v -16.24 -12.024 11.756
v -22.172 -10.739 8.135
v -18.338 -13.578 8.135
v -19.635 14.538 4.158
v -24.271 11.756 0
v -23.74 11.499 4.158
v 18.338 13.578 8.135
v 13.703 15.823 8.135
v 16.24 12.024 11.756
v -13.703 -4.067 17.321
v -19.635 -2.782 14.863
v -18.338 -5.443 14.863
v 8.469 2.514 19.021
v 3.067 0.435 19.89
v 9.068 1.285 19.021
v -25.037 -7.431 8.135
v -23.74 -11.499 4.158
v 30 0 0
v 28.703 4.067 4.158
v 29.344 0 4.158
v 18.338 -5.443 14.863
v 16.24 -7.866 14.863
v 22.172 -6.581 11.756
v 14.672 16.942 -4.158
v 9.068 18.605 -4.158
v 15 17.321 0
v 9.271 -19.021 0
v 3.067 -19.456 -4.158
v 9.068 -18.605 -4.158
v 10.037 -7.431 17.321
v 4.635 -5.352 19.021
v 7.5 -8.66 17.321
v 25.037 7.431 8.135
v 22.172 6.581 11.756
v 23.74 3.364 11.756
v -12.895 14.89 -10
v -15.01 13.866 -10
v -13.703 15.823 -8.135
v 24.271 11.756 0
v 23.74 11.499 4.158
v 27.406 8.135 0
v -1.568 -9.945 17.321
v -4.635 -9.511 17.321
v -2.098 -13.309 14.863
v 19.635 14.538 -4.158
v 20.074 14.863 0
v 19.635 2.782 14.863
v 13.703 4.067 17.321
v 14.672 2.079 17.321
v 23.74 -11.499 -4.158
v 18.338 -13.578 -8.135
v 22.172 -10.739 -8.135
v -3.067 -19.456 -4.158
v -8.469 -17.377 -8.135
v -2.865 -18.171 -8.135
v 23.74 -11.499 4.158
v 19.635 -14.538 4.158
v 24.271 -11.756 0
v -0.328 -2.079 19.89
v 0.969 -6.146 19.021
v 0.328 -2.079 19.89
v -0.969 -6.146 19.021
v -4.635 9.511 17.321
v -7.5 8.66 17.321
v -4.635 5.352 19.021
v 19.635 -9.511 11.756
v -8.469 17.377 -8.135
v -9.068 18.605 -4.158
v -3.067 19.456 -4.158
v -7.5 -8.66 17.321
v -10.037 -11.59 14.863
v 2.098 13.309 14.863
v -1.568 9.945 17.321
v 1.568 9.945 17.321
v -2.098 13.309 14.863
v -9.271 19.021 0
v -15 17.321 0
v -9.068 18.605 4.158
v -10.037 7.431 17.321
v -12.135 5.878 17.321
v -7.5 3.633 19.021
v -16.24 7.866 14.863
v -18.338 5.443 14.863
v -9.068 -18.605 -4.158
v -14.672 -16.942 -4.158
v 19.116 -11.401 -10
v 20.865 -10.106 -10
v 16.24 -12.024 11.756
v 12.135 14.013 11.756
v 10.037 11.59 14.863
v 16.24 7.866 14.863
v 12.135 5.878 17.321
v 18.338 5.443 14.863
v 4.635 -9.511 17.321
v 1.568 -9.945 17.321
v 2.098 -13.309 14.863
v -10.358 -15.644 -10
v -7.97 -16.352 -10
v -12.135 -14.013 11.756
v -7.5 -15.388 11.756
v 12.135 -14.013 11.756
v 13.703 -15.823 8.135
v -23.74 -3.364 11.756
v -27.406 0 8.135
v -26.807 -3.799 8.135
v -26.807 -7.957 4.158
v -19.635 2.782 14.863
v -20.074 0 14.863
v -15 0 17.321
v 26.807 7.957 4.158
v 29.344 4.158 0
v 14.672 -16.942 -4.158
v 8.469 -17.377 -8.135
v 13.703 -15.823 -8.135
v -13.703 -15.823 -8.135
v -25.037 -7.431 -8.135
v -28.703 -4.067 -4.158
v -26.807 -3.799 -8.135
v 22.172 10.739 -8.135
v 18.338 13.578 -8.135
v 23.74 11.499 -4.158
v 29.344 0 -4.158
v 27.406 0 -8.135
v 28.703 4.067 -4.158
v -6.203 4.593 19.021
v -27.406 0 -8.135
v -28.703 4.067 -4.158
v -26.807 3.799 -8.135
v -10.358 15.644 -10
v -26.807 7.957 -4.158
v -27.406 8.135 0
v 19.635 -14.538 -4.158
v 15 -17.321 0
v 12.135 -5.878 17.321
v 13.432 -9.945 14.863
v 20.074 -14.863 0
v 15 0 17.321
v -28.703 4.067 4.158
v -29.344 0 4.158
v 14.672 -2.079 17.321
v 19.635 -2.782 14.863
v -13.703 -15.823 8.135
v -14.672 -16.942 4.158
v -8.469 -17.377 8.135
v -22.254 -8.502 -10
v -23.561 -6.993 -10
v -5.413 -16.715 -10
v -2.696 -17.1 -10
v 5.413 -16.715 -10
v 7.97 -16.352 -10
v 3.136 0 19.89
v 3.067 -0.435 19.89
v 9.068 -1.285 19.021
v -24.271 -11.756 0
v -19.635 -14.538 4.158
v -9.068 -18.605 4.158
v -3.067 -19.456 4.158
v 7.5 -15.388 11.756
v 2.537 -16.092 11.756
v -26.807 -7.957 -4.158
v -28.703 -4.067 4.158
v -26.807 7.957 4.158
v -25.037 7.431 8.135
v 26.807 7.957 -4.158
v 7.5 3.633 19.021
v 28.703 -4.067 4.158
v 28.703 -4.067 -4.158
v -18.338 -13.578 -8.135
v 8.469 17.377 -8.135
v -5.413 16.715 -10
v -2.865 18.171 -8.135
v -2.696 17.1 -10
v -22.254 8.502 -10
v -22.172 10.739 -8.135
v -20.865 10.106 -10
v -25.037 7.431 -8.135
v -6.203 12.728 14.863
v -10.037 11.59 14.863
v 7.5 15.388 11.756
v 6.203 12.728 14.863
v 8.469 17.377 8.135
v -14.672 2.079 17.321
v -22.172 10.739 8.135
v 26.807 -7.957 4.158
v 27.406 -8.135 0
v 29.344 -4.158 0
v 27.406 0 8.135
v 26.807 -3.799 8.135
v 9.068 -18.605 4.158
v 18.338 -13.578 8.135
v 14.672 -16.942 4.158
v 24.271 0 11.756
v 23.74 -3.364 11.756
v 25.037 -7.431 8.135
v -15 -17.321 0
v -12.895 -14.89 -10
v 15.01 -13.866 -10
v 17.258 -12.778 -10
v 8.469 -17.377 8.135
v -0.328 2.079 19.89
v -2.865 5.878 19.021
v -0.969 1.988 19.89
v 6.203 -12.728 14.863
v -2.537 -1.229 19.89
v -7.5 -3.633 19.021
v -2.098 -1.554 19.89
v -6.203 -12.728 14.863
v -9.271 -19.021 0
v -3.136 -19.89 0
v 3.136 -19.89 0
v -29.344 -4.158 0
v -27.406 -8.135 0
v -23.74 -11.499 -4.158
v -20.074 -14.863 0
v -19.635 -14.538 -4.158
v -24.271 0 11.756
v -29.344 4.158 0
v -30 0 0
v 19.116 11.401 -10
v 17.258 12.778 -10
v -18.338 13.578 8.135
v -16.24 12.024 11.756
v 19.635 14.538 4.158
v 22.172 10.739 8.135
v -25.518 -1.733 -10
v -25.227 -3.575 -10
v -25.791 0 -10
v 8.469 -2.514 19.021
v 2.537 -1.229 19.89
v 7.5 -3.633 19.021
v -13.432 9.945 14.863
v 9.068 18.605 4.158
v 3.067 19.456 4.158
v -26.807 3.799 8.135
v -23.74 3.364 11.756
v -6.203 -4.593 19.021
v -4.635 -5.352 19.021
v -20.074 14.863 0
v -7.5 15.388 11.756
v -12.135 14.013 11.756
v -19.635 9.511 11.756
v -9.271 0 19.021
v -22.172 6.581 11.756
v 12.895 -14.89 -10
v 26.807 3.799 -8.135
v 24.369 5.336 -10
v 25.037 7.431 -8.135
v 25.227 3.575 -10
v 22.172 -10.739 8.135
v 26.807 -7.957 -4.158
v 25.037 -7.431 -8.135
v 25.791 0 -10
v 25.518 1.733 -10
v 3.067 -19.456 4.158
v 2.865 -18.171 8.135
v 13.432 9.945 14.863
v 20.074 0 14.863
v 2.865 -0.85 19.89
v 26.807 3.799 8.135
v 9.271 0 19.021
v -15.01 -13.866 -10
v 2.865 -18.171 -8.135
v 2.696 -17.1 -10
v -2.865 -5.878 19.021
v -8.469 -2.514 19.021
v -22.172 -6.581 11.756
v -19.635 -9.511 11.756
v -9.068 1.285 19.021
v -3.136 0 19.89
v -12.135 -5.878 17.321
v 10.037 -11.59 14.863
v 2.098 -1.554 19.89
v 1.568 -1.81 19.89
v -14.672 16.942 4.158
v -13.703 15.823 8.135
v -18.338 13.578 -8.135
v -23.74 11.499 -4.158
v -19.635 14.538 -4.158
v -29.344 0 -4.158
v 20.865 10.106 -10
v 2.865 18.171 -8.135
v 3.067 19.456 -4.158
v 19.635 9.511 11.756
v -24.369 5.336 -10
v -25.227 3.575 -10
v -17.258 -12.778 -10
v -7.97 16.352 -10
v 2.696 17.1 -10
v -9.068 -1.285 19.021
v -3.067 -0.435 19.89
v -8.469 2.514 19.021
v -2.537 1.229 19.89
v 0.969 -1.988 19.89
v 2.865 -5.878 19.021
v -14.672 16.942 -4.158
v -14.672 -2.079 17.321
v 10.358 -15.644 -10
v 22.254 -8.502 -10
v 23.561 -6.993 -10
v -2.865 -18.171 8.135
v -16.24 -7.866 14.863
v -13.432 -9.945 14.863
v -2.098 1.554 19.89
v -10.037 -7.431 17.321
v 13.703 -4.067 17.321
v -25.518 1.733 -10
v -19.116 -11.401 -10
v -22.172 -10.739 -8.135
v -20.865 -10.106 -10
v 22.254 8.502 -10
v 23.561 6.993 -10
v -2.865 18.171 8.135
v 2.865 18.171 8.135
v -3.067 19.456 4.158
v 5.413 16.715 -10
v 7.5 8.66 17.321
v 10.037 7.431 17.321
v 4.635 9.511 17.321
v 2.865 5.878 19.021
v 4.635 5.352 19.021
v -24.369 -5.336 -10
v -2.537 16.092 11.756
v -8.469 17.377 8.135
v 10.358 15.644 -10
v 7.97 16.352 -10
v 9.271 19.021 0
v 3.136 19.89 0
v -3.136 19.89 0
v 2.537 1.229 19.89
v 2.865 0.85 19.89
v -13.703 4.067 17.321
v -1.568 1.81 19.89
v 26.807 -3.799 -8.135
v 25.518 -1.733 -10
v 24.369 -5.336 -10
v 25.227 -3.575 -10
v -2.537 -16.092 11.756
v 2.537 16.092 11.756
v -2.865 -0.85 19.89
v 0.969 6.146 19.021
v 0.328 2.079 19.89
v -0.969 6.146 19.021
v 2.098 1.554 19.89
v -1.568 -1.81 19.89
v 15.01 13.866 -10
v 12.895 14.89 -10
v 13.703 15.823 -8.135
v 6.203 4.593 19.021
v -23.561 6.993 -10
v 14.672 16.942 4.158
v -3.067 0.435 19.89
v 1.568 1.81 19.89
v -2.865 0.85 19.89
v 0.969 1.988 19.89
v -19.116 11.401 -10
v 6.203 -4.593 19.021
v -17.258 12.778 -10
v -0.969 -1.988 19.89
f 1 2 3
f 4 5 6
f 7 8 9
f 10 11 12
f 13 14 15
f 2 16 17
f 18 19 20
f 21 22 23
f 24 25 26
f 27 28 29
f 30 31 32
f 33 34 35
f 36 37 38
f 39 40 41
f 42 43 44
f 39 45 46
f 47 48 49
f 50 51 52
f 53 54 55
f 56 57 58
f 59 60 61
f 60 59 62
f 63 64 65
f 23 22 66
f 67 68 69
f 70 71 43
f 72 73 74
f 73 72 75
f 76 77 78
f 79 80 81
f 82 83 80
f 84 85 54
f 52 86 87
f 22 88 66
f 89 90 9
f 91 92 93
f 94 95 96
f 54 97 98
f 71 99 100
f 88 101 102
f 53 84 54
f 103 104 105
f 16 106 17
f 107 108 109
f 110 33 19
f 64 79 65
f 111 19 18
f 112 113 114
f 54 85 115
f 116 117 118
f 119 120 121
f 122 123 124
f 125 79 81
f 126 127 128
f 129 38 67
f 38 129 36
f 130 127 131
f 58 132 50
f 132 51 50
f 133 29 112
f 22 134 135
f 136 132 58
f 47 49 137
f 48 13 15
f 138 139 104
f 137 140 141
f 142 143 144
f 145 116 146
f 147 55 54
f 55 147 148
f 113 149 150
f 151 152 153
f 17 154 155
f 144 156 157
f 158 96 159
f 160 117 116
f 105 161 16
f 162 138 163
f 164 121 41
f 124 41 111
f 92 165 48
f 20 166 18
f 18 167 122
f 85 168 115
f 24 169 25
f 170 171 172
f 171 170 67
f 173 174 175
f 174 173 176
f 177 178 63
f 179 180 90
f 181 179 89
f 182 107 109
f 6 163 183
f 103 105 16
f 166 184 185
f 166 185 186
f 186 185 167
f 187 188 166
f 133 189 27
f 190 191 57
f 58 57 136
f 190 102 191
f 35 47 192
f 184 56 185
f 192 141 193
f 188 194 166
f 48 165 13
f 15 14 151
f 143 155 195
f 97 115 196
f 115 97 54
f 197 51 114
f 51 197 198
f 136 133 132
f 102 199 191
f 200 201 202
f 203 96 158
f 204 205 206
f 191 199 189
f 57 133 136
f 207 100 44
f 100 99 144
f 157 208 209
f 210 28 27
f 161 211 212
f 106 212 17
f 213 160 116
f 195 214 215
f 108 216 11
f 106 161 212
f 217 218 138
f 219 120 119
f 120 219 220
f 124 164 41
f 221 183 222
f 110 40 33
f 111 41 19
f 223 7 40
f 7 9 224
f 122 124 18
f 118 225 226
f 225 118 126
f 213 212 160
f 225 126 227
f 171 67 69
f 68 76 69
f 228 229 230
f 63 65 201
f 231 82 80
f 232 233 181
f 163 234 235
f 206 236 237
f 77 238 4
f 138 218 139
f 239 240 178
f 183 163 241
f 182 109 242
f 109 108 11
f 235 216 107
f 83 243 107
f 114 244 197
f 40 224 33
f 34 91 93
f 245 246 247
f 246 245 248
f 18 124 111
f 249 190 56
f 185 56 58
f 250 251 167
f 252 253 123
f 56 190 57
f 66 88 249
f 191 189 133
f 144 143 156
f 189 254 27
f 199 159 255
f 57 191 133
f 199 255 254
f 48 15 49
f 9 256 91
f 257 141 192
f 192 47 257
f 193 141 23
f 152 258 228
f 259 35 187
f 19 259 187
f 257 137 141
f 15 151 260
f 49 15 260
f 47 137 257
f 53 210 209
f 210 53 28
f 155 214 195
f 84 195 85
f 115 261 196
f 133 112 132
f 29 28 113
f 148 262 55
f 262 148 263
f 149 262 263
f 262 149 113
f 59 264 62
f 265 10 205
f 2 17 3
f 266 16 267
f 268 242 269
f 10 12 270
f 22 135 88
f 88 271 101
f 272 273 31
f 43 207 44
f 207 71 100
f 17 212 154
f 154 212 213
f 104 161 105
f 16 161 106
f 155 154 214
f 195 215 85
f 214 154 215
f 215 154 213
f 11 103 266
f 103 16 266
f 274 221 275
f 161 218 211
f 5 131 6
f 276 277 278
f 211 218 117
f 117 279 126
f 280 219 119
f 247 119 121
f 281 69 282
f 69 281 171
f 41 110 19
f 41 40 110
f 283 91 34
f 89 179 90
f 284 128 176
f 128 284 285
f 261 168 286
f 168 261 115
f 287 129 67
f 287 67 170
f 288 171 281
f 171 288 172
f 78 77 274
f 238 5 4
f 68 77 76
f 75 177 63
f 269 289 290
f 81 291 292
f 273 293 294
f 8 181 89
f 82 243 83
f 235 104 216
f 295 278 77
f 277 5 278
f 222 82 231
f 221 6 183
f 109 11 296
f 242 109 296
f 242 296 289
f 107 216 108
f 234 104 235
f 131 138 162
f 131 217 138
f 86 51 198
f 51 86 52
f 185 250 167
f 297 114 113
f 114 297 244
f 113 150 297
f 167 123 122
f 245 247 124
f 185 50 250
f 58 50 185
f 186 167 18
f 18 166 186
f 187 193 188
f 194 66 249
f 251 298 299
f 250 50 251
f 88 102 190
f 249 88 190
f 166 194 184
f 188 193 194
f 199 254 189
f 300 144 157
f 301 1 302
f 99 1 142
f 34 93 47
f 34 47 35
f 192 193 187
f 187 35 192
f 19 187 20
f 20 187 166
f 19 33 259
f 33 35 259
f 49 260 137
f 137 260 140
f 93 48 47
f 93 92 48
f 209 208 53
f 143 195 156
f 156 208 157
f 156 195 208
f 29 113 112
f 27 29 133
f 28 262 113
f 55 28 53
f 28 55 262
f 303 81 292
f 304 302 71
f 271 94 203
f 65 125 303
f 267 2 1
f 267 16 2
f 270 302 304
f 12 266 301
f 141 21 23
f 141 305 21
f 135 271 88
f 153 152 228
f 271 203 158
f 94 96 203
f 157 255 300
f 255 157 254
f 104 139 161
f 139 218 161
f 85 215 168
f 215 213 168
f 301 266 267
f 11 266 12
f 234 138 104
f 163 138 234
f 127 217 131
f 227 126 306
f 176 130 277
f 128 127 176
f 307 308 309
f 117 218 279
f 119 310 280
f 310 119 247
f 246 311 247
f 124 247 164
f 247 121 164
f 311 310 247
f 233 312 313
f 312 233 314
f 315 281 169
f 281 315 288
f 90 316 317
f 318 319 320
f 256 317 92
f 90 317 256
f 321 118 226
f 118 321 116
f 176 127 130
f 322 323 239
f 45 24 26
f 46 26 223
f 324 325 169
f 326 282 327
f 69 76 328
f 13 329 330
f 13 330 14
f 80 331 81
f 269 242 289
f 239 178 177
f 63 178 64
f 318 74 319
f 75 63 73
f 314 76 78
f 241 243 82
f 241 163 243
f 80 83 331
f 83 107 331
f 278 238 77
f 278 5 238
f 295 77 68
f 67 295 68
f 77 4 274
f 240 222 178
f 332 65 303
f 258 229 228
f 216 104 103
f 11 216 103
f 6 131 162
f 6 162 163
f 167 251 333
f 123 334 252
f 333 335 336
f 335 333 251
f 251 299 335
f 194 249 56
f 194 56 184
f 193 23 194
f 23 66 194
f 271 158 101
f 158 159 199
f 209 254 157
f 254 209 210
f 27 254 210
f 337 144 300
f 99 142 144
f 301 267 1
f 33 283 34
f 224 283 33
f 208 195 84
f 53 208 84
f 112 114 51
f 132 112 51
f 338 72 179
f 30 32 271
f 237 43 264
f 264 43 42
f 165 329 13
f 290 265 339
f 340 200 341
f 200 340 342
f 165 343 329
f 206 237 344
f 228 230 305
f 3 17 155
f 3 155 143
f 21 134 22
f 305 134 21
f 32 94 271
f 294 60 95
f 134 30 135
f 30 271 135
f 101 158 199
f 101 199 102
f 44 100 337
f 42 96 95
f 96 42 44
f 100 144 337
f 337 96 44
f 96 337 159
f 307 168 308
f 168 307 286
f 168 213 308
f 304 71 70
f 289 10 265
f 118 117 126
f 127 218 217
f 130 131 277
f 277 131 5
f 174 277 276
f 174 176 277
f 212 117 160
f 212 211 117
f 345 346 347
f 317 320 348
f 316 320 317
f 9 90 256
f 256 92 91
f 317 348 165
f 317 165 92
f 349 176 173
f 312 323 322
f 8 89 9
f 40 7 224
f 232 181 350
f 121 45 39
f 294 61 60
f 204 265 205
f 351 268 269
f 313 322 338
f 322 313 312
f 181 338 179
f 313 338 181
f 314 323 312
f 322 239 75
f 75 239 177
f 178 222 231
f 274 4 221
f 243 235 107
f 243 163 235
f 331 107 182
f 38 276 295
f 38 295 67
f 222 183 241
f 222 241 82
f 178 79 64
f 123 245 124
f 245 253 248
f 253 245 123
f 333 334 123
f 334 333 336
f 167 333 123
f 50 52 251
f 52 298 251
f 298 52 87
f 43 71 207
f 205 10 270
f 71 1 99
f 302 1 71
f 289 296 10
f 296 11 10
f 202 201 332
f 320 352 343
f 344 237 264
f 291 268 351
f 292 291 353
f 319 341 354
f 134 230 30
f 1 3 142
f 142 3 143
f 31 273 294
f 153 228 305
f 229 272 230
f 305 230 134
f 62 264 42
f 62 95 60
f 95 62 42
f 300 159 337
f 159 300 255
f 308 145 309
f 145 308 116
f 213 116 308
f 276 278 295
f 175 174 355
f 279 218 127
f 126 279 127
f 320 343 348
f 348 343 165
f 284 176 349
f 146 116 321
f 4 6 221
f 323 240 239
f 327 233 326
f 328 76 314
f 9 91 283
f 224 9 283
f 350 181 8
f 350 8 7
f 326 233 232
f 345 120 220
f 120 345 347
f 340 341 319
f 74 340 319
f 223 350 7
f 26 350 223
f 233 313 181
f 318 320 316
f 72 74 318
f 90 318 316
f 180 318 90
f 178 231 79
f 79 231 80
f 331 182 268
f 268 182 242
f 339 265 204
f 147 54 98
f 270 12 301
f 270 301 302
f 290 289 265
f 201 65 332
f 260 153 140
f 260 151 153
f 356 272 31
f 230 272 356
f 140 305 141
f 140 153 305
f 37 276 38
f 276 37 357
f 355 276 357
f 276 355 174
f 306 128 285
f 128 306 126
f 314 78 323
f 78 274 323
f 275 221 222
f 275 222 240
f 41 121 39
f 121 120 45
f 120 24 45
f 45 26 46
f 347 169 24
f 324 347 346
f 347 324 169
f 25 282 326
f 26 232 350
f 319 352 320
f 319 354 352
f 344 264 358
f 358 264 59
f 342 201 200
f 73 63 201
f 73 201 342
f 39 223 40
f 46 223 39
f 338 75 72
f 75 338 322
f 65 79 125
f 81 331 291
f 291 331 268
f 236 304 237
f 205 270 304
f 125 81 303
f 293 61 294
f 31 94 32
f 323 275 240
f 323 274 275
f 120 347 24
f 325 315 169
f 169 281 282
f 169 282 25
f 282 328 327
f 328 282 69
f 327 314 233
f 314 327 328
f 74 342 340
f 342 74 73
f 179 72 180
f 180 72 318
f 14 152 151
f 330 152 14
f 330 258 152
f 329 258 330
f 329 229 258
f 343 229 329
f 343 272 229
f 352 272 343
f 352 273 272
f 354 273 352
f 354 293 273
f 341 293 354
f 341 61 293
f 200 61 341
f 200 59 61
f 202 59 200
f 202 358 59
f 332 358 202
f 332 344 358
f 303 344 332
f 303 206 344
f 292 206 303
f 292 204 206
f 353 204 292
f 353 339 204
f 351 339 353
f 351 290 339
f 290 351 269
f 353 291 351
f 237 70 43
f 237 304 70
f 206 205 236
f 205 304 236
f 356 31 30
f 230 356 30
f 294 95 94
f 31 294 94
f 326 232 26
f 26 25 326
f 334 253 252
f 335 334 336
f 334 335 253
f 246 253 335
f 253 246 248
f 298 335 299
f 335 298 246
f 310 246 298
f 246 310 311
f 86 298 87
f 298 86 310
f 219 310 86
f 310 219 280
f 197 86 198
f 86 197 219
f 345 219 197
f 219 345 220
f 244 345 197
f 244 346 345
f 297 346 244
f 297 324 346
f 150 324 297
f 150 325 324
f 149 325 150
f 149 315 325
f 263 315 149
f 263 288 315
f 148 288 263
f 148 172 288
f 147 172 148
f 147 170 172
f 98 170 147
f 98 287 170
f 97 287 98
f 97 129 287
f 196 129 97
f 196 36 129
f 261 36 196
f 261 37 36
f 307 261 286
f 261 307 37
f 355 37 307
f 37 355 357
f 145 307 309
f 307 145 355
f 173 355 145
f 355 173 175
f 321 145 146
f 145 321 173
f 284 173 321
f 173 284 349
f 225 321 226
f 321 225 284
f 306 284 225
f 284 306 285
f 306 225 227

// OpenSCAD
r = 20;
d = 2*r;
xf = 1.5;
cf = 0.25;

module head()
{

    difference()
    {
        scale([xf,1,1])
            sphere(r=r);
        translate([-xf*r, -r, -r])
        cube([xf*d, d, d*cf]);
    }
    
}
head();
